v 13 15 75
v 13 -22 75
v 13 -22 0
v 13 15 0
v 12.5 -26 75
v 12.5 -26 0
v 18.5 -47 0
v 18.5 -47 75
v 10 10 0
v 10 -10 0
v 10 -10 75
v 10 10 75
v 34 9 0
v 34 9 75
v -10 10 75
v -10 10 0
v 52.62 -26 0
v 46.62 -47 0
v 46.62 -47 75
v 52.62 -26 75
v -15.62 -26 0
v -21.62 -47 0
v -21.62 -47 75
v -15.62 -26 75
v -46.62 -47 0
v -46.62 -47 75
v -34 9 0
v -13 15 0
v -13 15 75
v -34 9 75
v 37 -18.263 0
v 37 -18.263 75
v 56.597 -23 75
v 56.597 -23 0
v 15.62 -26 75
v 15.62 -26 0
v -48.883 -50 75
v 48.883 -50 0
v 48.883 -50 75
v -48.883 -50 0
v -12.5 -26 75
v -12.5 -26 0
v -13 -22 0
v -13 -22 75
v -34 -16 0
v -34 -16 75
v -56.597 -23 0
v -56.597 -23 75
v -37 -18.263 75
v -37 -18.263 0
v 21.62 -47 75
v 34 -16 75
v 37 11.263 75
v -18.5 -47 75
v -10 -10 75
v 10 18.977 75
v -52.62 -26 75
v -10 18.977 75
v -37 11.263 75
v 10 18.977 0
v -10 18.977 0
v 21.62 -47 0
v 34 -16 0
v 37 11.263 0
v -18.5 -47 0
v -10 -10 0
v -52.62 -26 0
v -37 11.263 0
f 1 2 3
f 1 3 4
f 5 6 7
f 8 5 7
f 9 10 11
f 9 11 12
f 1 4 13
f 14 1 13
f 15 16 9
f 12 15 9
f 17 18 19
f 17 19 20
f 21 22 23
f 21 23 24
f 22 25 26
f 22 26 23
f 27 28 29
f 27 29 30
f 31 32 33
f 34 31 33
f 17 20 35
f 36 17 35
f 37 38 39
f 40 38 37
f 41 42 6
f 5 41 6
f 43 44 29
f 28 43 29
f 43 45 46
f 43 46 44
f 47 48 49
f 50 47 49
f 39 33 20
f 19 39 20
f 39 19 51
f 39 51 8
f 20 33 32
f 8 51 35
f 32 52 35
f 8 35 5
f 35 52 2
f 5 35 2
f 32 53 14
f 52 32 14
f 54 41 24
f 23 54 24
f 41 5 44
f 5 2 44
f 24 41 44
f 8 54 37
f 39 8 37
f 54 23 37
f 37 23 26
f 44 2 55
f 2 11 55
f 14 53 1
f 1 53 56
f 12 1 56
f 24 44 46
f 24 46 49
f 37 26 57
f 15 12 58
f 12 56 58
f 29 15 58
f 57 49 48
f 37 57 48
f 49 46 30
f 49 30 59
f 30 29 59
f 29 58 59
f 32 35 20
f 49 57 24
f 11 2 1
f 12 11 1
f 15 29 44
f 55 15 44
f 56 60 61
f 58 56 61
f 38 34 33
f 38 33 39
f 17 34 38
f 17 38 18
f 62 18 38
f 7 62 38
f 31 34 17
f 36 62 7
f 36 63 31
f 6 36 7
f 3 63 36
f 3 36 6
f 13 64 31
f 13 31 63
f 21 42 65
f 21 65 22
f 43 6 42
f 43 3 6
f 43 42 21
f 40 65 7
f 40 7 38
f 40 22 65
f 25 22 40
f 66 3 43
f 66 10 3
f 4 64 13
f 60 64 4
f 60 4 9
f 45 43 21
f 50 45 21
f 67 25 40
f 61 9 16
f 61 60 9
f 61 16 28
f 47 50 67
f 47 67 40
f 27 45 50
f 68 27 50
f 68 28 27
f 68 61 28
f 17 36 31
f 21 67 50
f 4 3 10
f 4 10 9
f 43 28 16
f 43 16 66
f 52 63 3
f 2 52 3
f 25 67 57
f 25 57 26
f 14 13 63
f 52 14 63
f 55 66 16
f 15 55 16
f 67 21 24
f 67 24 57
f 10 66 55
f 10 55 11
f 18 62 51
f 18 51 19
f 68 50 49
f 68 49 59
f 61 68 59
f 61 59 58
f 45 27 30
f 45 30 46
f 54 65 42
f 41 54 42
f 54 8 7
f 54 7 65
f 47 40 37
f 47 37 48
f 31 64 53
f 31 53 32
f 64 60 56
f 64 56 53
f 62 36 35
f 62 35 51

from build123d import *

# Parameters (mm, degrees)
SKETCH1_W           = 20
SKETCH1_H           = 20
BOSS_EXTRUDE1_DEPTH = 75


with BuildPart() as part:
    # Sketch1 → Boss-Extrude1 (new body)
    with BuildSketch(Plane.XY):
        Polygon((56.597237048, -23), (48.882951334, -50), (-48.882951334, -50), (-56.597237048, -23), (-37, -18.262904238), (-37, 11.262904238), (-10, 18.977189953), (0, 18.977189953), (10, 18.977189953), (37, 11.262904238), (37, -18.262904238), align=None)
        Rectangle(SKETCH1_W, SKETCH1_H, mode=Mode.SUBTRACT)
        Polygon((-12.5, -26), (12.5, -26), (18.5, -47), (-18.5, -47), align=None, mode=Mode.SUBTRACT)
        Polygon((15.620047095, -26), (21.620047095, -47), (46.620047095, -47), (52.620047095, -26), align=None, mode=Mode.SUBTRACT)
        Polygon((-15.620047095, -26), (-52.620047095, -26), (-46.620047095, -47), (-21.620047095, -47), align=None, mode=Mode.SUBTRACT)
        Polygon((-13, -22), (-13, 15), (-34, 9), (-34, -16), align=None, mode=Mode.SUBTRACT)
        Polygon((34, 9), (34, -16), (13, -22), (13, 15), align=None, mode=Mode.SUBTRACT)
    extrude(amount=BOSS_EXTRUDE1_DEPTH)


solid = part.part
